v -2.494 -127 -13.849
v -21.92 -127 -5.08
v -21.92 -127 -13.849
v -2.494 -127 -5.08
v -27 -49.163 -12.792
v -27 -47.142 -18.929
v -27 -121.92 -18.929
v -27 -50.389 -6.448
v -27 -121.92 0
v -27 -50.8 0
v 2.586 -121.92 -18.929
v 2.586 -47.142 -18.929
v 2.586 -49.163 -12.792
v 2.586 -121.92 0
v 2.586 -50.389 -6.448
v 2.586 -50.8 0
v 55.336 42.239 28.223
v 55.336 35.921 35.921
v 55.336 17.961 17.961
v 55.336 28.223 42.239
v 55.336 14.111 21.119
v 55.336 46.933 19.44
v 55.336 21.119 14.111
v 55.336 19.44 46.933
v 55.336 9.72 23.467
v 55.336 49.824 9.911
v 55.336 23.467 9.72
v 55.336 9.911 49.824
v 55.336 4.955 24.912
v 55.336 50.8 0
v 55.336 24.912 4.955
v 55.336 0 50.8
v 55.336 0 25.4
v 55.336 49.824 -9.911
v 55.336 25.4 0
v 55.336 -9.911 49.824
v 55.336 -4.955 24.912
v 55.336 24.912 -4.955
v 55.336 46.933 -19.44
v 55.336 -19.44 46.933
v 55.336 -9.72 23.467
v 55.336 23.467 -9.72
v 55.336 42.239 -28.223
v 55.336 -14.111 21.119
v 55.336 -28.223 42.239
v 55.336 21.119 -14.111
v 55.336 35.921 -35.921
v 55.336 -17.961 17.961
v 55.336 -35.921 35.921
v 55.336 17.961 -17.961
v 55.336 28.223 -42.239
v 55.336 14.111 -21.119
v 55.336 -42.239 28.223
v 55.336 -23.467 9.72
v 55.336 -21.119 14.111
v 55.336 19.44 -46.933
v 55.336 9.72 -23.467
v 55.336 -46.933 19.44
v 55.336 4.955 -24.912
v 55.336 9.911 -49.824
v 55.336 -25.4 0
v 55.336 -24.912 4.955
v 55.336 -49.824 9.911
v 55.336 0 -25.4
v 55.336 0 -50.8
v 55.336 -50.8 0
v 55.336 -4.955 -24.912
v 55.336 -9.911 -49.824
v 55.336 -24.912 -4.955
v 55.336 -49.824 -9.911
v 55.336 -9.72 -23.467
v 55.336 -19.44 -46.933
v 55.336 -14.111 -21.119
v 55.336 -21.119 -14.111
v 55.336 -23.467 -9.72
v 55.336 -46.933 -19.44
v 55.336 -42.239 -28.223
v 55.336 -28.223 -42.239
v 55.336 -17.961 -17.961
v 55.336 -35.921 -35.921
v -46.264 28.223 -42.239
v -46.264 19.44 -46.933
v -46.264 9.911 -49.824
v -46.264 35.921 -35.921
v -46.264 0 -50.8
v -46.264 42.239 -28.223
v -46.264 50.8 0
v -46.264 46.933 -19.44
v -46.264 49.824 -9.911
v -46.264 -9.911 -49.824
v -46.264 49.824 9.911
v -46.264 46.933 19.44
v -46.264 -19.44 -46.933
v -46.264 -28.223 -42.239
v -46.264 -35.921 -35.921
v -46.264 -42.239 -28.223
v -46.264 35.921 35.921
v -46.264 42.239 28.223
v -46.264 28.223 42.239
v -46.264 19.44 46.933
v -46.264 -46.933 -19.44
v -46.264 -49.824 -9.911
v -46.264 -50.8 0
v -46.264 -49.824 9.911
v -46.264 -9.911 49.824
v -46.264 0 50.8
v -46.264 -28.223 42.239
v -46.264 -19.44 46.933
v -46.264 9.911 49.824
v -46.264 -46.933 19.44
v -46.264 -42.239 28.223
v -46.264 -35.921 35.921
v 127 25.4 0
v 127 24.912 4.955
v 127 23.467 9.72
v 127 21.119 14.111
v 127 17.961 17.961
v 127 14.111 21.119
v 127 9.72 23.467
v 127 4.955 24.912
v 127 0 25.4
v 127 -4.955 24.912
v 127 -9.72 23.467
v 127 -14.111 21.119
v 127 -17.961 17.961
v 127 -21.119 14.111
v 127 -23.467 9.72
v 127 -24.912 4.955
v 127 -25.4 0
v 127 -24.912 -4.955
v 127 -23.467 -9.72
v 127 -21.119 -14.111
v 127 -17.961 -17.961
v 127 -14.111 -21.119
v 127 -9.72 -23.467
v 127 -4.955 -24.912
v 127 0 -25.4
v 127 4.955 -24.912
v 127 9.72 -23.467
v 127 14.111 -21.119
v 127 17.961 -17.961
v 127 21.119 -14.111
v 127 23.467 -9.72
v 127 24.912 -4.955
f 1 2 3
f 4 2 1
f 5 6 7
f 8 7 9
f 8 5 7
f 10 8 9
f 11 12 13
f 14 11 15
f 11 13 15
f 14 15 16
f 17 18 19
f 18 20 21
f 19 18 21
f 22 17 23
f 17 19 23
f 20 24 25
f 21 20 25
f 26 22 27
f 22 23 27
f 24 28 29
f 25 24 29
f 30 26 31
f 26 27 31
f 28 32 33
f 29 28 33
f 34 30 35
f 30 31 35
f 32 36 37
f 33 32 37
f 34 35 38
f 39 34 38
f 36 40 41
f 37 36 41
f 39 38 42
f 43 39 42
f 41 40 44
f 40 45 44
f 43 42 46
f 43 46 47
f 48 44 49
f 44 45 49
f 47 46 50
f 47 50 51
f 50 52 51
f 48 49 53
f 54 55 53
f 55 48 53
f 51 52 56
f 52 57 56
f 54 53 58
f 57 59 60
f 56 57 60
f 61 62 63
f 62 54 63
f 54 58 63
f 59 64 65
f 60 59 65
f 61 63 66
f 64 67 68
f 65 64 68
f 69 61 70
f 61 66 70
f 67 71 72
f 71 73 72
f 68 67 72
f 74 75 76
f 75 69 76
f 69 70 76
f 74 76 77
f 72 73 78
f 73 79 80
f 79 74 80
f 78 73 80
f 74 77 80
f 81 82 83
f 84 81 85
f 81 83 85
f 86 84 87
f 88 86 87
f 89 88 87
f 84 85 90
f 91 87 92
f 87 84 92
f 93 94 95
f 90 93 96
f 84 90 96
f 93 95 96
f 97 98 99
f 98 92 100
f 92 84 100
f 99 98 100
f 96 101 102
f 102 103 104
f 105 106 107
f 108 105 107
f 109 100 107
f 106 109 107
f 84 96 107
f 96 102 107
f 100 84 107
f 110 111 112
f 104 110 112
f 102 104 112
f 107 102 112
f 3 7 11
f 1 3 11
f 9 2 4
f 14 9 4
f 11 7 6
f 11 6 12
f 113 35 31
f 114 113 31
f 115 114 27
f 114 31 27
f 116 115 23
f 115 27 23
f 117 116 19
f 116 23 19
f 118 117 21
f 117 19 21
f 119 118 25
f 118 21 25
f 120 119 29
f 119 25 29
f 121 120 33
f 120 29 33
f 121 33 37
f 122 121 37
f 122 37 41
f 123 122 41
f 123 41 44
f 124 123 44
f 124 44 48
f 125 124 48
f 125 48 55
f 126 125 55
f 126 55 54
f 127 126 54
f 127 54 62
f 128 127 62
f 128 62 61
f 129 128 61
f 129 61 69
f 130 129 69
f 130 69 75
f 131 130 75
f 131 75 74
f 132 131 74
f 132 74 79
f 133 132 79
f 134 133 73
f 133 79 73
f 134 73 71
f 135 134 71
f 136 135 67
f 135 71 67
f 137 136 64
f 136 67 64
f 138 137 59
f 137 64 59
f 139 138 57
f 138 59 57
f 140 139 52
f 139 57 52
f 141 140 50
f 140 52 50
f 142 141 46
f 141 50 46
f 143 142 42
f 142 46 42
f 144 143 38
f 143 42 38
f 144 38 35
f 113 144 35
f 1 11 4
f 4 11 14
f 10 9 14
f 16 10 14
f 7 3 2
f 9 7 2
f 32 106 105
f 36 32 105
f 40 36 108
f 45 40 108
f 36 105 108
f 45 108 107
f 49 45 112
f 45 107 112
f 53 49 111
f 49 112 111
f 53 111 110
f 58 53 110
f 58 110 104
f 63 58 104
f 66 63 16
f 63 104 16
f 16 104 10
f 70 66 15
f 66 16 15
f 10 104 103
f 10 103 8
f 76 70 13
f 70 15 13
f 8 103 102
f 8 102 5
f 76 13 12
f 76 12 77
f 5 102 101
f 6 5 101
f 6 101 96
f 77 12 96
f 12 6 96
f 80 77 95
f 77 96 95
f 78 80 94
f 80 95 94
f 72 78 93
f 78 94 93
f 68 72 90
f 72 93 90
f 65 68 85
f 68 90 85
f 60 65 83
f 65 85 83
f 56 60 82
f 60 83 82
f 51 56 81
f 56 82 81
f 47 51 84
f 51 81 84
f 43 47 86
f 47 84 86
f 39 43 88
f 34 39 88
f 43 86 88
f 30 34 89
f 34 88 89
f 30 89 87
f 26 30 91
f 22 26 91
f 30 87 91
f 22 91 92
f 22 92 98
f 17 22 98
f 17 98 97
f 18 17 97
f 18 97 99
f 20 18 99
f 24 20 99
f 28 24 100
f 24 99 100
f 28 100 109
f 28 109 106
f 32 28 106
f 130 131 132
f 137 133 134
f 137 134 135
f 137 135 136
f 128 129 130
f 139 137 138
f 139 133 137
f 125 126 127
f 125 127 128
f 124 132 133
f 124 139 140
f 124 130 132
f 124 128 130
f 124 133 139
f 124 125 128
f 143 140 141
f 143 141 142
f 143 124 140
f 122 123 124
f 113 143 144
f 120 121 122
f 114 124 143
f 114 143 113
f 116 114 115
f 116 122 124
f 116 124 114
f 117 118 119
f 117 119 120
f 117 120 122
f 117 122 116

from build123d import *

# Parameters (mm, degrees)
F2_R     = 25.4
F3_DEPTH = 127
F4_W     = 29.586202
F4_H     = 18.928807
F5_DEPTH = 127
F6_SIZE2 = 5.08
F6_SIZE  = 5.08


with BuildPart() as f1:
    # F0 (on Front) → F1 (revolve)
    with BuildSketch(Plane.XZ):
        Polygon((55.335713, 50.8), (-46.264287, 50.8), (-46.264287, 0), (12.566184, 0), (55.335713, 0), align=None)
    revolve(axis=Axis((4.535713, 0, 0), (1, 0, 0)))

    # F2 (on Right) → F3 (join)
    with BuildSketch(Plane.YZ):
        Circle(F2_R)
    extrude(amount=F3_DEPTH)

    # F4 (on Front) → F5 (join)
    with BuildSketch(Plane.XZ):
        with Locations((-12.207311, -9.464403)):
            Rectangle(F4_W, F4_H)
    extrude(amount=F5_DEPTH)

    # F6
    f6_edges = [f1.edges().sort_by_distance(p)[0] for p in [
        (2.58579, -127, -9.464404),
        (-12.207311, -127, 0),
        (-27.000412, -127, -9.464404),
        (-12.207311, -127, -18.928807),
    ]]
    chamfer(f6_edges, length=F6_SIZE, length2=F6_SIZE2)


solid = f1.part
